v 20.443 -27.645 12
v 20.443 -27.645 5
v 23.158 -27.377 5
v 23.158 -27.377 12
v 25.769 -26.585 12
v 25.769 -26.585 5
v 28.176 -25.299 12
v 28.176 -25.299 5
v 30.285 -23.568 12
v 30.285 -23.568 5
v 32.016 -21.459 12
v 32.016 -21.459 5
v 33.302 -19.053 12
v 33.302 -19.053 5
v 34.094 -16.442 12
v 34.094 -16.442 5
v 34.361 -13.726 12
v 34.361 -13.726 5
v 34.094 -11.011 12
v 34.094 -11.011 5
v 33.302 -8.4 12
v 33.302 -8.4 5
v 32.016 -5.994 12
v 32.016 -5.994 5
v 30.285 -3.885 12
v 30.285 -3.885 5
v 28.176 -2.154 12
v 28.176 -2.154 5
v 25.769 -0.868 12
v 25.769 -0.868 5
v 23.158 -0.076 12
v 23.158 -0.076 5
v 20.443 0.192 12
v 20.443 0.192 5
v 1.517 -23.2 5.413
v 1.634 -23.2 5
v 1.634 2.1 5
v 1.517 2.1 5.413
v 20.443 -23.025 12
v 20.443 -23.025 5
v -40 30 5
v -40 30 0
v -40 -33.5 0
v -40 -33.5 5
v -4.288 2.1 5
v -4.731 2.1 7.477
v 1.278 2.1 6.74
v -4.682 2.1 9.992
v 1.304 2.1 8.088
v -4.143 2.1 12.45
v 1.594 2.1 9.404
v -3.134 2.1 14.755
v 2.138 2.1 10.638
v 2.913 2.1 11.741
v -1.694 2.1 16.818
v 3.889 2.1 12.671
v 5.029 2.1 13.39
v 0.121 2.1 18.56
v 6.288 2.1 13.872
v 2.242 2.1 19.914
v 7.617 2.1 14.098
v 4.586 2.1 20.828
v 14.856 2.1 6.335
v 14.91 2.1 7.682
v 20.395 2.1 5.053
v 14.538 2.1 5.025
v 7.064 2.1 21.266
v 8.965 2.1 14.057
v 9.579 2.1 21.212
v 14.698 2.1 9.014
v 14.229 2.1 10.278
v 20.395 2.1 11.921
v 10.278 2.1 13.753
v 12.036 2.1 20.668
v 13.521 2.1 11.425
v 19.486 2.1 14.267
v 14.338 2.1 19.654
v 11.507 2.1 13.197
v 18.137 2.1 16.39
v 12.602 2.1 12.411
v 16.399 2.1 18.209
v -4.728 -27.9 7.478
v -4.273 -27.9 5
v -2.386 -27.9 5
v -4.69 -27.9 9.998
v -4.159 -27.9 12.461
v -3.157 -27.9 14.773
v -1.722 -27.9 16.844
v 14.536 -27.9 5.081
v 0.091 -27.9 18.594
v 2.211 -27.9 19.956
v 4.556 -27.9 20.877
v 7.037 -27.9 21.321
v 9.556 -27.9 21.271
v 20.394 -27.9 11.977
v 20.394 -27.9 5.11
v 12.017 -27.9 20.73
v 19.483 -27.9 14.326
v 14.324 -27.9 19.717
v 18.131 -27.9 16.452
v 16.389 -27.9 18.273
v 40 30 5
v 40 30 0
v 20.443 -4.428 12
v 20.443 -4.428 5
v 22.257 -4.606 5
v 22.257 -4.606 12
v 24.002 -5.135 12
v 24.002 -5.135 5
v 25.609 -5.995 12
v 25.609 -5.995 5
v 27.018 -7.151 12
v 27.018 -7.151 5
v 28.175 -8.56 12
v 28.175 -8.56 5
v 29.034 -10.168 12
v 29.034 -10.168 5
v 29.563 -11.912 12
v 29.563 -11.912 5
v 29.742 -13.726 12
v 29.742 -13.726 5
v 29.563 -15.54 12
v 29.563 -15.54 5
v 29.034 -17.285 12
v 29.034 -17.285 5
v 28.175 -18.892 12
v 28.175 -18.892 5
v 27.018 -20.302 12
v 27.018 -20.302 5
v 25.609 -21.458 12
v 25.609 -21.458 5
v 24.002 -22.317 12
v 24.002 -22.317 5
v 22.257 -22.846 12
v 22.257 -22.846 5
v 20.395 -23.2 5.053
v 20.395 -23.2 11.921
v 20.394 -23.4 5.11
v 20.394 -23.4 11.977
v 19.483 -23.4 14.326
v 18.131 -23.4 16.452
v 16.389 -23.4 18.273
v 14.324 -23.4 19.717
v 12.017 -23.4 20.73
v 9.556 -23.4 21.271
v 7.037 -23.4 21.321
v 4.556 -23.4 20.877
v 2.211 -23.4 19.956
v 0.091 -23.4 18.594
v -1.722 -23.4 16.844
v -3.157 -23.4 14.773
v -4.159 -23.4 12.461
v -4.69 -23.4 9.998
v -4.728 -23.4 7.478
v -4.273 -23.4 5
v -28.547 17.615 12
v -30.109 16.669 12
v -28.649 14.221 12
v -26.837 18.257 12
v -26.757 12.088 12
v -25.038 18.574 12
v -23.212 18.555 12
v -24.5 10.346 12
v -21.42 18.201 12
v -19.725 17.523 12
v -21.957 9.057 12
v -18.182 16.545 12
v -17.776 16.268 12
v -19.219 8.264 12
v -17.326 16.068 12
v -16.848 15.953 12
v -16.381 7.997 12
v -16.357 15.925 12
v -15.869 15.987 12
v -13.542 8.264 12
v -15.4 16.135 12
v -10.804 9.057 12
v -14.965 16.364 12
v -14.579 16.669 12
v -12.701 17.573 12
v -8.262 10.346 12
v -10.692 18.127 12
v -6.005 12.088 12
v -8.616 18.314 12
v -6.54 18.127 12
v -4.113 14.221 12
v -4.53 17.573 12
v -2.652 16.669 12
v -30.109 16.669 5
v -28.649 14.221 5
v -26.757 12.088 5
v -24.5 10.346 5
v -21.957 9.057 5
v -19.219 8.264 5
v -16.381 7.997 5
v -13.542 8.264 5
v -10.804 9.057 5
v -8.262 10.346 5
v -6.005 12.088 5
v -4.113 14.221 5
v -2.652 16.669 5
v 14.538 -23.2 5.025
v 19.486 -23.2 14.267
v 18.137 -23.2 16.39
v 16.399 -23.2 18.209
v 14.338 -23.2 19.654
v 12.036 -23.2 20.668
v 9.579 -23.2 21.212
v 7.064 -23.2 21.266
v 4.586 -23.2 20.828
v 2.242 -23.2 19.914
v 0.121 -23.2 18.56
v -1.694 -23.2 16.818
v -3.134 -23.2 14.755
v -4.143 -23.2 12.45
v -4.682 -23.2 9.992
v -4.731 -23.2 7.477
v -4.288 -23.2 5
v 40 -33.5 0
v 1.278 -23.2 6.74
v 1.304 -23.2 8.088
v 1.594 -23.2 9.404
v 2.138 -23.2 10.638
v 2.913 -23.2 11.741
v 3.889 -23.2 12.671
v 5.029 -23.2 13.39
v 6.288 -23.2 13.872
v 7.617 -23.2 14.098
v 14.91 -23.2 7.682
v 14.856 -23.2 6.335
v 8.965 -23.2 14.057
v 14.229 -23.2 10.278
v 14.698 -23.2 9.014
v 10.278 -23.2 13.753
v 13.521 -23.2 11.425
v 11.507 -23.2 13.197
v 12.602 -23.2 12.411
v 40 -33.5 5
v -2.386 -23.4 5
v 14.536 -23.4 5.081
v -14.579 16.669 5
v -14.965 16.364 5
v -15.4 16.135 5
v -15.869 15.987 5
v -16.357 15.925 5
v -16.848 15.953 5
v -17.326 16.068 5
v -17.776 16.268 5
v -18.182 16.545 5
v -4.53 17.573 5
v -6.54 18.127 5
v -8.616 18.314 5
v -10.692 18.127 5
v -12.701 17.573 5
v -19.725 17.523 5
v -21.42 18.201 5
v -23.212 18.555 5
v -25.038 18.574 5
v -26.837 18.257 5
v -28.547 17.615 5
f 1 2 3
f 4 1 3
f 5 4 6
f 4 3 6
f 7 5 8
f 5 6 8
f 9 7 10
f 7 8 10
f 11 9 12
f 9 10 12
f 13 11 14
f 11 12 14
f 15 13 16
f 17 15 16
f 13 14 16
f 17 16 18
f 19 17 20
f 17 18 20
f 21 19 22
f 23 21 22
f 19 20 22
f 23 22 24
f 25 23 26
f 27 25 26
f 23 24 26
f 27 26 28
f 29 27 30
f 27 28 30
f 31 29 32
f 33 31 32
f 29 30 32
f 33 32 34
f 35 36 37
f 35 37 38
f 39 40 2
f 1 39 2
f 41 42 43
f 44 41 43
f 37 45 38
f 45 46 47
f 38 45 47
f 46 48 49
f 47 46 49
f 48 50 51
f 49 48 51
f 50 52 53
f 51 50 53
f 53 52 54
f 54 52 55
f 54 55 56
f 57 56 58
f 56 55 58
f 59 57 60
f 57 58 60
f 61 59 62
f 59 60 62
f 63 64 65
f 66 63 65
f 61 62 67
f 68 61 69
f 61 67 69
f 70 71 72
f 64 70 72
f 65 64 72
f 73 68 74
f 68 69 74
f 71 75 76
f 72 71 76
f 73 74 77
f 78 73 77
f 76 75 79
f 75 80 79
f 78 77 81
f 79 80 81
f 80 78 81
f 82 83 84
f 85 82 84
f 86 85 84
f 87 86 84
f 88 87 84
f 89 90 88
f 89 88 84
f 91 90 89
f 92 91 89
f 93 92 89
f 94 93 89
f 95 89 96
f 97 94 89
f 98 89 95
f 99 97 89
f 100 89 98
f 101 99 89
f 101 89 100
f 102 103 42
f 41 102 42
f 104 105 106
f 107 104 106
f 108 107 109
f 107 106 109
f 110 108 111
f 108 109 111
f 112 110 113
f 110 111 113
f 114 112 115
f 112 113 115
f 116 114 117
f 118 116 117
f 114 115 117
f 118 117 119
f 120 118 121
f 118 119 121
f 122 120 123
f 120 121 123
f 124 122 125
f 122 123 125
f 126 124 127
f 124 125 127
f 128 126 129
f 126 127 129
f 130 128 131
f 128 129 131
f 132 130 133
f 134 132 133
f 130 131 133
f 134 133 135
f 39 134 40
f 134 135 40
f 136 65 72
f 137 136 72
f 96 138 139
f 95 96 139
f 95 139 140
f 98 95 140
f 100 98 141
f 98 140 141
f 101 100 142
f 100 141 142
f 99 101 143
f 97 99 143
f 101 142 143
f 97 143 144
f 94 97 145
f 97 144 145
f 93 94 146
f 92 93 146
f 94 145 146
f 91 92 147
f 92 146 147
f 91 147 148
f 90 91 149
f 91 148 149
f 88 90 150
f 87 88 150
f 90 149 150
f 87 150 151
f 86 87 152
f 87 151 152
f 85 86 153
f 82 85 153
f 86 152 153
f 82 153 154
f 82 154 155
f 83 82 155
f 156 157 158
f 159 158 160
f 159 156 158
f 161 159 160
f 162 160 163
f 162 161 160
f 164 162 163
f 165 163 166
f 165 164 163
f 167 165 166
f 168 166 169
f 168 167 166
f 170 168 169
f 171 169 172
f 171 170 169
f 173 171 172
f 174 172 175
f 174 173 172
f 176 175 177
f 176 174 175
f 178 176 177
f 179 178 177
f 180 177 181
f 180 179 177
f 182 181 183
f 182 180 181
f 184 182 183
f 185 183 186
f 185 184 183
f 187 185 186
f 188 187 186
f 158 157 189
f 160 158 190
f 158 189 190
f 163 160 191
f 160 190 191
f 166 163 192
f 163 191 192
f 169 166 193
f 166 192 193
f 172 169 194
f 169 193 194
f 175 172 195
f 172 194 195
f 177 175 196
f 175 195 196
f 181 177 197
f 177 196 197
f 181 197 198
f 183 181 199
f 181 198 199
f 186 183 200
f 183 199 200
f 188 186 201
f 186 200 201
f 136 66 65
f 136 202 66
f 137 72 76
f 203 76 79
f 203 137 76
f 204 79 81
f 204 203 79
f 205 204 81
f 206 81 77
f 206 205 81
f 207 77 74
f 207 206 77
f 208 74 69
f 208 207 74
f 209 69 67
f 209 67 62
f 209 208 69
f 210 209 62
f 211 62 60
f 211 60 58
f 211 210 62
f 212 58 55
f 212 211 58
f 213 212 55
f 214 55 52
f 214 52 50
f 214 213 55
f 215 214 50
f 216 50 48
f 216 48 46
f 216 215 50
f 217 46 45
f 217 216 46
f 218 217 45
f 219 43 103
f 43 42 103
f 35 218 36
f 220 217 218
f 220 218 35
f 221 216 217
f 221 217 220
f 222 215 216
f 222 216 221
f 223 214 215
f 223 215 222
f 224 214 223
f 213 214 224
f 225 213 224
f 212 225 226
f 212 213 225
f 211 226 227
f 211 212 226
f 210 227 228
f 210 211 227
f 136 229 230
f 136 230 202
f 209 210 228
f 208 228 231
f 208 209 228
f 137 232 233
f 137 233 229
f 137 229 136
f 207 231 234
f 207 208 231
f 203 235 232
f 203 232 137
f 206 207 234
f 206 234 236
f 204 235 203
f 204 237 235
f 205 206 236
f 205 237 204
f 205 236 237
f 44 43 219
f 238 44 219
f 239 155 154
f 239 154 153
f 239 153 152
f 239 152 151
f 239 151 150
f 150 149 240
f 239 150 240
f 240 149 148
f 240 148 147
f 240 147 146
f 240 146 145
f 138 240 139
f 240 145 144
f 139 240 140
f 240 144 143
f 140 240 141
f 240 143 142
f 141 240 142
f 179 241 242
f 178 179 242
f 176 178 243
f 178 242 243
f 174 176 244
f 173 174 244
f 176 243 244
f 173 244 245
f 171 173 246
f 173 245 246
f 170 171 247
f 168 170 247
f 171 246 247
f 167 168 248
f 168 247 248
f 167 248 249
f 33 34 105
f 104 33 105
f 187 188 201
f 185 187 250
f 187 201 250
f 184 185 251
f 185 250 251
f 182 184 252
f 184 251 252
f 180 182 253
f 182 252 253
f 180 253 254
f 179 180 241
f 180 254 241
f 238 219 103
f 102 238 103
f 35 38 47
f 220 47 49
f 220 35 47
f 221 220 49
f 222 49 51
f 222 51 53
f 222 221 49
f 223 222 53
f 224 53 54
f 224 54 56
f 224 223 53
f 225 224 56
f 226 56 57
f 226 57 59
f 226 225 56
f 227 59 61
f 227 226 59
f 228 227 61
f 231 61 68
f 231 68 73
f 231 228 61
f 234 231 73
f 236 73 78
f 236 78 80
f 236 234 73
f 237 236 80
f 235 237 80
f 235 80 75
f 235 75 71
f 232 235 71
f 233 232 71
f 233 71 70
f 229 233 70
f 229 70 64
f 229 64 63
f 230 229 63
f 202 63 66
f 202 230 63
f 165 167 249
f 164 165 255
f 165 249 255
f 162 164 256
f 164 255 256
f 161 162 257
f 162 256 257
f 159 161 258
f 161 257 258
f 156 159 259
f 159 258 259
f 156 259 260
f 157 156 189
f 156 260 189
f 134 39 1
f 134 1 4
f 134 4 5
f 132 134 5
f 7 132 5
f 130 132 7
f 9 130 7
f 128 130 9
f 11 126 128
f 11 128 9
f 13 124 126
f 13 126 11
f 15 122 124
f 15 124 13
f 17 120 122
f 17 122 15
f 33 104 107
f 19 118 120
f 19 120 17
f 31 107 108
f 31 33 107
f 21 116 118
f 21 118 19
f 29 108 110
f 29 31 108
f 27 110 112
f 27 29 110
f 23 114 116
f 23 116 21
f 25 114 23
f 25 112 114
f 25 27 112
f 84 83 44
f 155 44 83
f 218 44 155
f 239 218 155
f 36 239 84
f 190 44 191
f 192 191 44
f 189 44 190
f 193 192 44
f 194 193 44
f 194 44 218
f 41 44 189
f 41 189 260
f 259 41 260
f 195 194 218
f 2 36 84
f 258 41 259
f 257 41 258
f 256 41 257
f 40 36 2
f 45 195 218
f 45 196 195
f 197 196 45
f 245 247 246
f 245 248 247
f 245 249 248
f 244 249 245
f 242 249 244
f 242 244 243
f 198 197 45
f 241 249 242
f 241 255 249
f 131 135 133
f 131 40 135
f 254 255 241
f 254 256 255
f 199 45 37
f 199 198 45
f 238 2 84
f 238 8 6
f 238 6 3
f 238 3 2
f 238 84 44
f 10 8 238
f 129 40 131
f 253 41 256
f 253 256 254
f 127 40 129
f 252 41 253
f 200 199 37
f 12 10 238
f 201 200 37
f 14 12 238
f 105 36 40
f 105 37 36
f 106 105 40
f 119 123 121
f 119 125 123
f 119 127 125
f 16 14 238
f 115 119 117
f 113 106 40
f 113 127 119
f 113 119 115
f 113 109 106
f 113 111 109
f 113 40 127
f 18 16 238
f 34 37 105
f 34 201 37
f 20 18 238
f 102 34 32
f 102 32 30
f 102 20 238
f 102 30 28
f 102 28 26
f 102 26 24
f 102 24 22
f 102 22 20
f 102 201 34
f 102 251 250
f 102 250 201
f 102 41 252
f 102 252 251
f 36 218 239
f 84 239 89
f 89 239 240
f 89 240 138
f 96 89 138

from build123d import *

# Parameters (mm, degrees)
F2_DEPTH      = 5
F3_DEPTH      = 12
F6_START      = 23.4
F6_DEPTH      = 4.5
F7_DEPTH      = 23.2
F7_DEPTH_BACK = 2.1


with BuildPart() as f2:
    # F0 (on Top) → F2 (new body)
    with BuildSketch(Plane.XY):
        Polygon((-40, -33.5), (40, -33.5), (40, -32.5), (40, -30), (40, 30), (-40, 30), (-40, -30), (-40, -32.5), align=None)
    extrude(amount=F2_DEPTH)

    # F1 (on Top) → F3 (join)
    with BuildSketch(Plane.XY):
        with BuildLine():
            ThreePointArc((-2.6521374299, 16.6687909301), (-16.3807168127, 12.4606072464), (-30.1092961955, 16.6687909301))
            ThreePointArc((-30.1092961955, 16.6687909301), (-16.3807168127, 7.9968769917), (-2.6521374299, 16.6687909301))
        make_face()
        with BuildLine():
            ThreePointArc((-14.5791374299, 16.6687909301), (-16.3571438566, 15.9253940397), (-18.1821348298, 16.5445497046))
            ThreePointArc((-18.1821348298, 16.5445497046), (-24.124880914, 18.6067924142), (-30.1092961955, 16.6687909301))
            ThreePointArc((-30.1092961955, 16.6687909301), (-16.3807168127, 12.4606072464), (-2.6521374299, 16.6687909301))
            ThreePointArc((-2.6521374299, 16.6687909301), (-8.6156374299, 18.3140845418), (-14.5791374299, 16.6687909301))
        make_face()
        with BuildLine():
            Line((20.4430632293, -23.025110057), (20.4430632293, -27.6445335891))
            ThreePointArc((20.4430632293, -27.6445335891), (34.3612617995, -13.7263350189), (20.4430632293, 0.1918635513))
            Line((20.4430632293, 0.1918635513), (20.4430632293, -4.4275599807))
            ThreePointArc((20.4430632293, -4.4275599807), (29.7418382675, -13.7263350189), (20.4430632293, -23.025110057))
        make_face()
    extrude(amount=F3_DEPTH)

    # F5 (on Front) → F6 (join)
    with BuildSketch(Plane.XZ.offset(F6_START)):
        with BuildLine():
            Line((20.3935885802, 5.1095173694), (20.3935885802, 11.976900753))
            ThreePointArc((20.3935885802, 11.976900753), (4.5517351525, 20.8753907692), (-4.2704897933, 4.9909395166))
            Line((-4.2704897933, 4.9909395166), (14.5364608753, 5.0813579703))
            Line((14.5364608753, 5.0813579703), (20.3935885802, 5.1095173694))
        make_face()
    extrude(amount=F6_DEPTH)

    # F4 (on Front) → F7 (join, two sides)
    with BuildSketch(Plane.XZ) as f7_sk:
        with BuildLine():
            Line((20.3951951116, 5.0531513989), (20.3951951116, 11.9205347825))
            ThreePointArc((20.3951951116, 11.9205347825), (4.553341684, 20.8190247987), (-4.2688832618, 4.9345735461))
            Line((-4.2688832618, 4.9345735461), (1.6444845672, 4.9630033317))
            Line((1.6444845672, 4.9630033317), (1.5165806981, 5.4129436612))
            ThreePointArc((1.5165806981, 5.4129436612), (8.2922385909, 14.1107486492), (14.5380674067, 5.0249919998))
            Line((14.5380674067, 5.0249919998), (20.3951951116, 5.0531513989))
        make_face()
    extrude(amount=F7_DEPTH)
    extrude(f7_sk.sketch, amount=-F7_DEPTH_BACK)


solid = f2.part
